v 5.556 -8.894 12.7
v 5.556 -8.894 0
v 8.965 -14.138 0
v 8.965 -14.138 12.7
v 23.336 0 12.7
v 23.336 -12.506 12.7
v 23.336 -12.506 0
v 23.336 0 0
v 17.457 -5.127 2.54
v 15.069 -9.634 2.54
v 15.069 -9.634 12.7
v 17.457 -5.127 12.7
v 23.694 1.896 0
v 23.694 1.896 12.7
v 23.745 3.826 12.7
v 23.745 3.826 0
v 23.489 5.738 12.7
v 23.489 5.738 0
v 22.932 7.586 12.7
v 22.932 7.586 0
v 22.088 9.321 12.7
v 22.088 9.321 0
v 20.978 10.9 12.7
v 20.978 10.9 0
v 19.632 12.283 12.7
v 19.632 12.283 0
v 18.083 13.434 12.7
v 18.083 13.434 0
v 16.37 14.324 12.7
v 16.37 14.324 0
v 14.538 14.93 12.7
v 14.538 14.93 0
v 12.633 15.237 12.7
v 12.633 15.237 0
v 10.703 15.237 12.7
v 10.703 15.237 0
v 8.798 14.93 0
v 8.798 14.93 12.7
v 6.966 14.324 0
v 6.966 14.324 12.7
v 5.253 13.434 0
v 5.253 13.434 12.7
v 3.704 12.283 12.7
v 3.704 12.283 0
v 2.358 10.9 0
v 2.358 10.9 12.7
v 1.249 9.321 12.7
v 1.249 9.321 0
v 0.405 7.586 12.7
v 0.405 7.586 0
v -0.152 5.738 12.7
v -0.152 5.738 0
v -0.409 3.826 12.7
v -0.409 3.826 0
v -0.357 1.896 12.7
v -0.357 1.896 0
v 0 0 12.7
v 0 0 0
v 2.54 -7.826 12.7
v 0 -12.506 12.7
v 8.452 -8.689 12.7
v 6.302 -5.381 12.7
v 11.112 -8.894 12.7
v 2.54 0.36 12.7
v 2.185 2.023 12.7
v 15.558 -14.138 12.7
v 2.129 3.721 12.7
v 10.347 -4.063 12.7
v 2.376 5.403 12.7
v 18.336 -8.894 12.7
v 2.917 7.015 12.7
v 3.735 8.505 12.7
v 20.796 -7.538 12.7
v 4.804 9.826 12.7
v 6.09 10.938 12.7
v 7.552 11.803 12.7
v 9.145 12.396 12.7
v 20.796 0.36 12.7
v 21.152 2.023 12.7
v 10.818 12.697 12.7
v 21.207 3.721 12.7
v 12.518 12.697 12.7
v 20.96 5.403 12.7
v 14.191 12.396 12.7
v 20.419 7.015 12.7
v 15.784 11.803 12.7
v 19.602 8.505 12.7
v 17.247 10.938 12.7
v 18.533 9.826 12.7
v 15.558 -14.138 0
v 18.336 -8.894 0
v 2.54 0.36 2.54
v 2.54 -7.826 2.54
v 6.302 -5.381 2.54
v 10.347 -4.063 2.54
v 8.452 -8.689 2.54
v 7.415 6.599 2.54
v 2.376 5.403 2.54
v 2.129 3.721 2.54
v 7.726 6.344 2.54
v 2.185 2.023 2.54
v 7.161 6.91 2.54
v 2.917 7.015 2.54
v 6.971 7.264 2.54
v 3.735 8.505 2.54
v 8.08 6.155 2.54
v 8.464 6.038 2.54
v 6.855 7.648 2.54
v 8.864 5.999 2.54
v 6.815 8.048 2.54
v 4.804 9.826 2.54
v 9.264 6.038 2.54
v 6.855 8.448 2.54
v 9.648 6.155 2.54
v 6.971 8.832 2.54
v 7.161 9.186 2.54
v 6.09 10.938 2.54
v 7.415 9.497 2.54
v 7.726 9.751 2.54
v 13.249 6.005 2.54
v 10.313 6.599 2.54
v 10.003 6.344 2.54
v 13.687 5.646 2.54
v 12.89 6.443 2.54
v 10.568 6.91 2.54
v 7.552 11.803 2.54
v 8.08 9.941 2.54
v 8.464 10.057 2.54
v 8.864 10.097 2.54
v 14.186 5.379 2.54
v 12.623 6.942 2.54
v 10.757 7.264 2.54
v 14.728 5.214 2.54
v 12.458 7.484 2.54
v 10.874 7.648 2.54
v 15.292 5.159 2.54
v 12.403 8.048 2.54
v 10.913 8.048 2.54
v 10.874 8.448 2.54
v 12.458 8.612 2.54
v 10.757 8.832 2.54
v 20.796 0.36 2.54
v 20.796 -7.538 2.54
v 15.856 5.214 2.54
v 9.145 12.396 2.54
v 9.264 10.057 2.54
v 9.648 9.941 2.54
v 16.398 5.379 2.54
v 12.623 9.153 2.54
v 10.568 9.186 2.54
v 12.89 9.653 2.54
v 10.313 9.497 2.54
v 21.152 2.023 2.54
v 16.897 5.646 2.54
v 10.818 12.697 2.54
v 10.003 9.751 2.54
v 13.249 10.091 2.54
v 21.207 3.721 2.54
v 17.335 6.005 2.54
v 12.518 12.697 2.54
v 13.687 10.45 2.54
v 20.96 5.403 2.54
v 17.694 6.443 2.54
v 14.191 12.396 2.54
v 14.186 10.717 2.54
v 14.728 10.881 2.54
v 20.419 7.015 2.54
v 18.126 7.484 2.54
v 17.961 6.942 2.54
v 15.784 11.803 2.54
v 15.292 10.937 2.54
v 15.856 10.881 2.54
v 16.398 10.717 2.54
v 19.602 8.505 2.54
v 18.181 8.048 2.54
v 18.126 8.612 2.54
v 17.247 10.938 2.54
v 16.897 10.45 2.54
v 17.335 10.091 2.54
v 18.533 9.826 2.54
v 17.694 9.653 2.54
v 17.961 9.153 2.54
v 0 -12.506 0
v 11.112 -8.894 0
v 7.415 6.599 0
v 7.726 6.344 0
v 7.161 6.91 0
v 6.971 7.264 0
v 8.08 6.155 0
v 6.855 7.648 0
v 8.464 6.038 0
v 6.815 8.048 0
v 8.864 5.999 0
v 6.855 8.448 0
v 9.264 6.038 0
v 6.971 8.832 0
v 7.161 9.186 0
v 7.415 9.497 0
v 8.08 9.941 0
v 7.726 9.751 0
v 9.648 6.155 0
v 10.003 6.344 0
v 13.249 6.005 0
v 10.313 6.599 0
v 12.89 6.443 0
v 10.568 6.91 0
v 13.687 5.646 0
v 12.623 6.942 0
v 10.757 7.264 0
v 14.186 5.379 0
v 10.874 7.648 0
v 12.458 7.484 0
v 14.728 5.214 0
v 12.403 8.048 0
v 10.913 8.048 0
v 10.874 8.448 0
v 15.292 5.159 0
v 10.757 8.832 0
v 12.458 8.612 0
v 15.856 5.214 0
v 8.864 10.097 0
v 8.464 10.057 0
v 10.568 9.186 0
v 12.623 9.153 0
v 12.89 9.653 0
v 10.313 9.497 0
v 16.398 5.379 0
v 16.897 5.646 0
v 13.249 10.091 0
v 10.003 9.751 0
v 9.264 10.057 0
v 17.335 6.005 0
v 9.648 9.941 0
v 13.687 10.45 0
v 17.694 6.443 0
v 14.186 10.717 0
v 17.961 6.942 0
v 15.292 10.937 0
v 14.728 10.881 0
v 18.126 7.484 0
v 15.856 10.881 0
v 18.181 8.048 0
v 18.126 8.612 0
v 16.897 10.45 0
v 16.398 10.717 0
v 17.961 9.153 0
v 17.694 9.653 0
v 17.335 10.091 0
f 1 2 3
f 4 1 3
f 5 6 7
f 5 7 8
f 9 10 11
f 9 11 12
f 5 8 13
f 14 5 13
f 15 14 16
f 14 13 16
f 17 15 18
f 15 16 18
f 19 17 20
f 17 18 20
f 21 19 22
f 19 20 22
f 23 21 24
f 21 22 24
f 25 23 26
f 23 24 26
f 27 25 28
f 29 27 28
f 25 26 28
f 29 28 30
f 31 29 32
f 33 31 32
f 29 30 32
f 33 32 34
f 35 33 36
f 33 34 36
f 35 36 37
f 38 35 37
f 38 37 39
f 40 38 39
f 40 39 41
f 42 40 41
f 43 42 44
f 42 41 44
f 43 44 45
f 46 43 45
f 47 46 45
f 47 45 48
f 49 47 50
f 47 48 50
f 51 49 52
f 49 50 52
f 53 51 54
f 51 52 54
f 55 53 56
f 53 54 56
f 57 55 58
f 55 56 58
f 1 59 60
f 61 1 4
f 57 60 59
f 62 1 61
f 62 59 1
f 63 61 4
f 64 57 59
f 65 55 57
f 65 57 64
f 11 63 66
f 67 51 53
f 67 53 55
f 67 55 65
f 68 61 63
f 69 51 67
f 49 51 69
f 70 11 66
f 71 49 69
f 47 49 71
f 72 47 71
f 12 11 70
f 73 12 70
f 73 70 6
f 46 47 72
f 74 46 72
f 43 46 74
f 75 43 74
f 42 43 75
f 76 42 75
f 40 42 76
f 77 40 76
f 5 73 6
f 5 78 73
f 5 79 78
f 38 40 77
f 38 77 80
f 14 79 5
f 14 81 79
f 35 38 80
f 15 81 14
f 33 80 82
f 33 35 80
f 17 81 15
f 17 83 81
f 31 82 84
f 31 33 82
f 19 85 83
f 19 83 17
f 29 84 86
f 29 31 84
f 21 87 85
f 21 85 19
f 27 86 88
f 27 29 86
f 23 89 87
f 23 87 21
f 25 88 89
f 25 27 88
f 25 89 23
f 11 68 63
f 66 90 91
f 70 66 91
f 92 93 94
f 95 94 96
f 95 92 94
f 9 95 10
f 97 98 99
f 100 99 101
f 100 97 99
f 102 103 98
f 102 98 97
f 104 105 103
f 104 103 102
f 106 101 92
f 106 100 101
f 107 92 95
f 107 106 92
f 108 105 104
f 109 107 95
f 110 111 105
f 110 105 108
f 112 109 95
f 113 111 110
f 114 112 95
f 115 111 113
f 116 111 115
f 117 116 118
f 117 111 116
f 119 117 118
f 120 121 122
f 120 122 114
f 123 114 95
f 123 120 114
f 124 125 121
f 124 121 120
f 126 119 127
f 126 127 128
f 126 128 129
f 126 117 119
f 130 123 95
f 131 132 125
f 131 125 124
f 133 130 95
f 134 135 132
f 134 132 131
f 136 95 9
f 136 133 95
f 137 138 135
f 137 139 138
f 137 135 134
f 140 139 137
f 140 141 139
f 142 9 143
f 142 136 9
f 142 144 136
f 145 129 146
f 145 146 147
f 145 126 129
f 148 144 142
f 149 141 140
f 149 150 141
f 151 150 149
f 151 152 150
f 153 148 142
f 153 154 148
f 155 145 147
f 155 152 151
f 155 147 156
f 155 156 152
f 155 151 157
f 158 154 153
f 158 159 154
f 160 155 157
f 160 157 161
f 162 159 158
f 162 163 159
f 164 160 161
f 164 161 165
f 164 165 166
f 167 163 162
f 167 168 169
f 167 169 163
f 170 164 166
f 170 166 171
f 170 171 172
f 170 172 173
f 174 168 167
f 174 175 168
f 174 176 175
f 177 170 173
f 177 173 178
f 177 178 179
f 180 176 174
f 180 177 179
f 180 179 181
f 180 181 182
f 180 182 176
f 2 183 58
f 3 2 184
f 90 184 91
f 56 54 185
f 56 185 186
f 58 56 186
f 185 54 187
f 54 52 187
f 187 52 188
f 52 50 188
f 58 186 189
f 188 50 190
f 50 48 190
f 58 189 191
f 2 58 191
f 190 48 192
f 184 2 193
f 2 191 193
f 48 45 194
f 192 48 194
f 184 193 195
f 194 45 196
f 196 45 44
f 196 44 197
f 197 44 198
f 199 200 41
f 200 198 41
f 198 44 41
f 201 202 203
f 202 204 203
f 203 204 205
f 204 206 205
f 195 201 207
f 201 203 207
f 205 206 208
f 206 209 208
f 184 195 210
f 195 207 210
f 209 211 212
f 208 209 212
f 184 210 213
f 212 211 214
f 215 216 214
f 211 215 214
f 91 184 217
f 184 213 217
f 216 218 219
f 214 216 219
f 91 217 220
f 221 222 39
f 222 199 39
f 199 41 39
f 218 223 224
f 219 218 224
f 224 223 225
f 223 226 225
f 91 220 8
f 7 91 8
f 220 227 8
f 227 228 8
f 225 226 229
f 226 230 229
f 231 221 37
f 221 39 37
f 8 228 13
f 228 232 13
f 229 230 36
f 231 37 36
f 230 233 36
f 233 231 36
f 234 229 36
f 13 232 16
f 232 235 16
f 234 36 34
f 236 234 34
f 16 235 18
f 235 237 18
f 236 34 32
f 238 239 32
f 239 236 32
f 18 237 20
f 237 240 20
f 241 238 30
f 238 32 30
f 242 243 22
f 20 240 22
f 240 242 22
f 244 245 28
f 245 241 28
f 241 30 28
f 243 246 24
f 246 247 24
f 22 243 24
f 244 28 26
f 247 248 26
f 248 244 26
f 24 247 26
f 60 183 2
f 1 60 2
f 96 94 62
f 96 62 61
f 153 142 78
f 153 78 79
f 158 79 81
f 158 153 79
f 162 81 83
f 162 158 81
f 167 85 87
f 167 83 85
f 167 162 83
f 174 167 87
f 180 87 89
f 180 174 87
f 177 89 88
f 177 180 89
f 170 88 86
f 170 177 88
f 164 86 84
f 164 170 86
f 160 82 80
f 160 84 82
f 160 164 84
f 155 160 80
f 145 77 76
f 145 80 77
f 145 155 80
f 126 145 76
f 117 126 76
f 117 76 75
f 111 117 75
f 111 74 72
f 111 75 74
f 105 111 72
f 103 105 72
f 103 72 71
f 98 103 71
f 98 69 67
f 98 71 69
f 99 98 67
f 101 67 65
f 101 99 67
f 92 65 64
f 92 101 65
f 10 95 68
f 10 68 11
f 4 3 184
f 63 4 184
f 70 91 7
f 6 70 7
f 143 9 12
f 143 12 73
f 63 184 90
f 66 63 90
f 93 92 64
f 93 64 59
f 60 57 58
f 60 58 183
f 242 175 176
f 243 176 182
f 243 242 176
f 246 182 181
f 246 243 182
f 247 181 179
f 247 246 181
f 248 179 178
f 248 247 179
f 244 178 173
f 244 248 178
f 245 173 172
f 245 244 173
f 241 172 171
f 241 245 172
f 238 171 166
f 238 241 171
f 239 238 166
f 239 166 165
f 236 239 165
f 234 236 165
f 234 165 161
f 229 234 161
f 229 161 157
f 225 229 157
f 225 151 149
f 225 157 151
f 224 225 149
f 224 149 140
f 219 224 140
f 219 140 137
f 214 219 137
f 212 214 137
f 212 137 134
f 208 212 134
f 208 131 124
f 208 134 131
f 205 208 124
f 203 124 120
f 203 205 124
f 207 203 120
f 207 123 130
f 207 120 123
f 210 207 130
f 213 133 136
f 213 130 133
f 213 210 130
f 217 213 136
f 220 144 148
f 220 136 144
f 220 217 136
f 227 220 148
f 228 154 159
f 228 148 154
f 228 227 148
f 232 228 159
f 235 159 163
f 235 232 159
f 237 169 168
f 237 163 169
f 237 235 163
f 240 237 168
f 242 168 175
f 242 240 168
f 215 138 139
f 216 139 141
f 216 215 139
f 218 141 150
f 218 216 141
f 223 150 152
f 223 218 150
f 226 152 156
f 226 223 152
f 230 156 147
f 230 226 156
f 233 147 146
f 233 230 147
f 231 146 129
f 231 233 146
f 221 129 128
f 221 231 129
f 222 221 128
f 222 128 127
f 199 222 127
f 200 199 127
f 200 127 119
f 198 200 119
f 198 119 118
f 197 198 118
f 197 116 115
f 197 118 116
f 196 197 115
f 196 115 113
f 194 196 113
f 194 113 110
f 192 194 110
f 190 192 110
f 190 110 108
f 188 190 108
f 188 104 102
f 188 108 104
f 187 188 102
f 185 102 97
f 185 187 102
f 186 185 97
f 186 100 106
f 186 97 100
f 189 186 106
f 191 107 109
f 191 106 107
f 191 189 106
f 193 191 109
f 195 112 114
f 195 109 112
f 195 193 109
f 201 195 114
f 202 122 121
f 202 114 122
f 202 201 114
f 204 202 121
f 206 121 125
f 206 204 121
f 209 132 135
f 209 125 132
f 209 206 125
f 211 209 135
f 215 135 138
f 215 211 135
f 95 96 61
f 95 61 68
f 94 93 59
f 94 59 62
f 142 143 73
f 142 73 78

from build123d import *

# Parameters (mm, degrees)
F0_R     = 2.7361365436
F0_R_2   = 5.9630121177
F1_DEPTH = 12.7
F3_T     = -2.54
F2_R     = 2.8890765553
F2_R_2   = 2.0489311255
F4_DEPTH = 61.976


with BuildPart() as f1:
    # F0 (on Top) → F1 (new body)
    with BuildSketch(Plane.XY):
        with BuildLine():
            Line((23.336250335, -12.5060621649), (23.336250335, 0))
            ThreePointArc((23.336250335, 0), (11.6681251675, 15.2751887217), (0, 0))
            Line((0, 0), (0, -12.5060621649))
            Line((0, -12.5060621649), (5.556251388, -8.8944993913))
            Line((5.556251388, -8.8944993913), (8.9647026685, -14.1382715047))
            Line((8.9647026685, -14.1382715047), (11.1124990508, -8.8944993913))
            Line((11.1124990508, -8.8944993913), (15.5575014651, -14.1382715047))
            Line((15.5575014651, -14.1382715047), (18.3356255293, -8.8944993913))
            Line((18.3356255293, -8.8944993913), (23.336250335, -12.5060621649))
        make_face()
        with Locations((4.4449996203, 4.1626878083)):
            Circle(F0_R, mode=Mode.SUBTRACT)
        with Locations((15.5575014651, 4.7183129936)):
            Circle(F0_R_2, mode=Mode.SUBTRACT)
        with Locations((15.5575014651, 4.7183129936)):
            Circle(F0_R_2)
        with Locations((4.4449996203, 4.1626878083)):
            Circle(F0_R)
    extrude(amount=F1_DEPTH)

    # F3
    f3_openings = [f1.faces().sort_by_distance(p)[0] for p in [
        (11.684831, 0.988921, 12.7),
    ]]
    offset(amount=F3_T, openings=f3_openings, kind=Kind.INTERSECTION)

    # F2 (on Top) → F4 (cut)
    with BuildSketch(Plane.XY):
        with Locations((15.2920437977, 8.0478740856)):
            Circle(F2_R)
        with Locations((8.8641922921, 8.0478740856)):
            Circle(F2_R_2)
    extrude(amount=F4_DEPTH, mode=Mode.SUBTRACT)


solid = f1.part
